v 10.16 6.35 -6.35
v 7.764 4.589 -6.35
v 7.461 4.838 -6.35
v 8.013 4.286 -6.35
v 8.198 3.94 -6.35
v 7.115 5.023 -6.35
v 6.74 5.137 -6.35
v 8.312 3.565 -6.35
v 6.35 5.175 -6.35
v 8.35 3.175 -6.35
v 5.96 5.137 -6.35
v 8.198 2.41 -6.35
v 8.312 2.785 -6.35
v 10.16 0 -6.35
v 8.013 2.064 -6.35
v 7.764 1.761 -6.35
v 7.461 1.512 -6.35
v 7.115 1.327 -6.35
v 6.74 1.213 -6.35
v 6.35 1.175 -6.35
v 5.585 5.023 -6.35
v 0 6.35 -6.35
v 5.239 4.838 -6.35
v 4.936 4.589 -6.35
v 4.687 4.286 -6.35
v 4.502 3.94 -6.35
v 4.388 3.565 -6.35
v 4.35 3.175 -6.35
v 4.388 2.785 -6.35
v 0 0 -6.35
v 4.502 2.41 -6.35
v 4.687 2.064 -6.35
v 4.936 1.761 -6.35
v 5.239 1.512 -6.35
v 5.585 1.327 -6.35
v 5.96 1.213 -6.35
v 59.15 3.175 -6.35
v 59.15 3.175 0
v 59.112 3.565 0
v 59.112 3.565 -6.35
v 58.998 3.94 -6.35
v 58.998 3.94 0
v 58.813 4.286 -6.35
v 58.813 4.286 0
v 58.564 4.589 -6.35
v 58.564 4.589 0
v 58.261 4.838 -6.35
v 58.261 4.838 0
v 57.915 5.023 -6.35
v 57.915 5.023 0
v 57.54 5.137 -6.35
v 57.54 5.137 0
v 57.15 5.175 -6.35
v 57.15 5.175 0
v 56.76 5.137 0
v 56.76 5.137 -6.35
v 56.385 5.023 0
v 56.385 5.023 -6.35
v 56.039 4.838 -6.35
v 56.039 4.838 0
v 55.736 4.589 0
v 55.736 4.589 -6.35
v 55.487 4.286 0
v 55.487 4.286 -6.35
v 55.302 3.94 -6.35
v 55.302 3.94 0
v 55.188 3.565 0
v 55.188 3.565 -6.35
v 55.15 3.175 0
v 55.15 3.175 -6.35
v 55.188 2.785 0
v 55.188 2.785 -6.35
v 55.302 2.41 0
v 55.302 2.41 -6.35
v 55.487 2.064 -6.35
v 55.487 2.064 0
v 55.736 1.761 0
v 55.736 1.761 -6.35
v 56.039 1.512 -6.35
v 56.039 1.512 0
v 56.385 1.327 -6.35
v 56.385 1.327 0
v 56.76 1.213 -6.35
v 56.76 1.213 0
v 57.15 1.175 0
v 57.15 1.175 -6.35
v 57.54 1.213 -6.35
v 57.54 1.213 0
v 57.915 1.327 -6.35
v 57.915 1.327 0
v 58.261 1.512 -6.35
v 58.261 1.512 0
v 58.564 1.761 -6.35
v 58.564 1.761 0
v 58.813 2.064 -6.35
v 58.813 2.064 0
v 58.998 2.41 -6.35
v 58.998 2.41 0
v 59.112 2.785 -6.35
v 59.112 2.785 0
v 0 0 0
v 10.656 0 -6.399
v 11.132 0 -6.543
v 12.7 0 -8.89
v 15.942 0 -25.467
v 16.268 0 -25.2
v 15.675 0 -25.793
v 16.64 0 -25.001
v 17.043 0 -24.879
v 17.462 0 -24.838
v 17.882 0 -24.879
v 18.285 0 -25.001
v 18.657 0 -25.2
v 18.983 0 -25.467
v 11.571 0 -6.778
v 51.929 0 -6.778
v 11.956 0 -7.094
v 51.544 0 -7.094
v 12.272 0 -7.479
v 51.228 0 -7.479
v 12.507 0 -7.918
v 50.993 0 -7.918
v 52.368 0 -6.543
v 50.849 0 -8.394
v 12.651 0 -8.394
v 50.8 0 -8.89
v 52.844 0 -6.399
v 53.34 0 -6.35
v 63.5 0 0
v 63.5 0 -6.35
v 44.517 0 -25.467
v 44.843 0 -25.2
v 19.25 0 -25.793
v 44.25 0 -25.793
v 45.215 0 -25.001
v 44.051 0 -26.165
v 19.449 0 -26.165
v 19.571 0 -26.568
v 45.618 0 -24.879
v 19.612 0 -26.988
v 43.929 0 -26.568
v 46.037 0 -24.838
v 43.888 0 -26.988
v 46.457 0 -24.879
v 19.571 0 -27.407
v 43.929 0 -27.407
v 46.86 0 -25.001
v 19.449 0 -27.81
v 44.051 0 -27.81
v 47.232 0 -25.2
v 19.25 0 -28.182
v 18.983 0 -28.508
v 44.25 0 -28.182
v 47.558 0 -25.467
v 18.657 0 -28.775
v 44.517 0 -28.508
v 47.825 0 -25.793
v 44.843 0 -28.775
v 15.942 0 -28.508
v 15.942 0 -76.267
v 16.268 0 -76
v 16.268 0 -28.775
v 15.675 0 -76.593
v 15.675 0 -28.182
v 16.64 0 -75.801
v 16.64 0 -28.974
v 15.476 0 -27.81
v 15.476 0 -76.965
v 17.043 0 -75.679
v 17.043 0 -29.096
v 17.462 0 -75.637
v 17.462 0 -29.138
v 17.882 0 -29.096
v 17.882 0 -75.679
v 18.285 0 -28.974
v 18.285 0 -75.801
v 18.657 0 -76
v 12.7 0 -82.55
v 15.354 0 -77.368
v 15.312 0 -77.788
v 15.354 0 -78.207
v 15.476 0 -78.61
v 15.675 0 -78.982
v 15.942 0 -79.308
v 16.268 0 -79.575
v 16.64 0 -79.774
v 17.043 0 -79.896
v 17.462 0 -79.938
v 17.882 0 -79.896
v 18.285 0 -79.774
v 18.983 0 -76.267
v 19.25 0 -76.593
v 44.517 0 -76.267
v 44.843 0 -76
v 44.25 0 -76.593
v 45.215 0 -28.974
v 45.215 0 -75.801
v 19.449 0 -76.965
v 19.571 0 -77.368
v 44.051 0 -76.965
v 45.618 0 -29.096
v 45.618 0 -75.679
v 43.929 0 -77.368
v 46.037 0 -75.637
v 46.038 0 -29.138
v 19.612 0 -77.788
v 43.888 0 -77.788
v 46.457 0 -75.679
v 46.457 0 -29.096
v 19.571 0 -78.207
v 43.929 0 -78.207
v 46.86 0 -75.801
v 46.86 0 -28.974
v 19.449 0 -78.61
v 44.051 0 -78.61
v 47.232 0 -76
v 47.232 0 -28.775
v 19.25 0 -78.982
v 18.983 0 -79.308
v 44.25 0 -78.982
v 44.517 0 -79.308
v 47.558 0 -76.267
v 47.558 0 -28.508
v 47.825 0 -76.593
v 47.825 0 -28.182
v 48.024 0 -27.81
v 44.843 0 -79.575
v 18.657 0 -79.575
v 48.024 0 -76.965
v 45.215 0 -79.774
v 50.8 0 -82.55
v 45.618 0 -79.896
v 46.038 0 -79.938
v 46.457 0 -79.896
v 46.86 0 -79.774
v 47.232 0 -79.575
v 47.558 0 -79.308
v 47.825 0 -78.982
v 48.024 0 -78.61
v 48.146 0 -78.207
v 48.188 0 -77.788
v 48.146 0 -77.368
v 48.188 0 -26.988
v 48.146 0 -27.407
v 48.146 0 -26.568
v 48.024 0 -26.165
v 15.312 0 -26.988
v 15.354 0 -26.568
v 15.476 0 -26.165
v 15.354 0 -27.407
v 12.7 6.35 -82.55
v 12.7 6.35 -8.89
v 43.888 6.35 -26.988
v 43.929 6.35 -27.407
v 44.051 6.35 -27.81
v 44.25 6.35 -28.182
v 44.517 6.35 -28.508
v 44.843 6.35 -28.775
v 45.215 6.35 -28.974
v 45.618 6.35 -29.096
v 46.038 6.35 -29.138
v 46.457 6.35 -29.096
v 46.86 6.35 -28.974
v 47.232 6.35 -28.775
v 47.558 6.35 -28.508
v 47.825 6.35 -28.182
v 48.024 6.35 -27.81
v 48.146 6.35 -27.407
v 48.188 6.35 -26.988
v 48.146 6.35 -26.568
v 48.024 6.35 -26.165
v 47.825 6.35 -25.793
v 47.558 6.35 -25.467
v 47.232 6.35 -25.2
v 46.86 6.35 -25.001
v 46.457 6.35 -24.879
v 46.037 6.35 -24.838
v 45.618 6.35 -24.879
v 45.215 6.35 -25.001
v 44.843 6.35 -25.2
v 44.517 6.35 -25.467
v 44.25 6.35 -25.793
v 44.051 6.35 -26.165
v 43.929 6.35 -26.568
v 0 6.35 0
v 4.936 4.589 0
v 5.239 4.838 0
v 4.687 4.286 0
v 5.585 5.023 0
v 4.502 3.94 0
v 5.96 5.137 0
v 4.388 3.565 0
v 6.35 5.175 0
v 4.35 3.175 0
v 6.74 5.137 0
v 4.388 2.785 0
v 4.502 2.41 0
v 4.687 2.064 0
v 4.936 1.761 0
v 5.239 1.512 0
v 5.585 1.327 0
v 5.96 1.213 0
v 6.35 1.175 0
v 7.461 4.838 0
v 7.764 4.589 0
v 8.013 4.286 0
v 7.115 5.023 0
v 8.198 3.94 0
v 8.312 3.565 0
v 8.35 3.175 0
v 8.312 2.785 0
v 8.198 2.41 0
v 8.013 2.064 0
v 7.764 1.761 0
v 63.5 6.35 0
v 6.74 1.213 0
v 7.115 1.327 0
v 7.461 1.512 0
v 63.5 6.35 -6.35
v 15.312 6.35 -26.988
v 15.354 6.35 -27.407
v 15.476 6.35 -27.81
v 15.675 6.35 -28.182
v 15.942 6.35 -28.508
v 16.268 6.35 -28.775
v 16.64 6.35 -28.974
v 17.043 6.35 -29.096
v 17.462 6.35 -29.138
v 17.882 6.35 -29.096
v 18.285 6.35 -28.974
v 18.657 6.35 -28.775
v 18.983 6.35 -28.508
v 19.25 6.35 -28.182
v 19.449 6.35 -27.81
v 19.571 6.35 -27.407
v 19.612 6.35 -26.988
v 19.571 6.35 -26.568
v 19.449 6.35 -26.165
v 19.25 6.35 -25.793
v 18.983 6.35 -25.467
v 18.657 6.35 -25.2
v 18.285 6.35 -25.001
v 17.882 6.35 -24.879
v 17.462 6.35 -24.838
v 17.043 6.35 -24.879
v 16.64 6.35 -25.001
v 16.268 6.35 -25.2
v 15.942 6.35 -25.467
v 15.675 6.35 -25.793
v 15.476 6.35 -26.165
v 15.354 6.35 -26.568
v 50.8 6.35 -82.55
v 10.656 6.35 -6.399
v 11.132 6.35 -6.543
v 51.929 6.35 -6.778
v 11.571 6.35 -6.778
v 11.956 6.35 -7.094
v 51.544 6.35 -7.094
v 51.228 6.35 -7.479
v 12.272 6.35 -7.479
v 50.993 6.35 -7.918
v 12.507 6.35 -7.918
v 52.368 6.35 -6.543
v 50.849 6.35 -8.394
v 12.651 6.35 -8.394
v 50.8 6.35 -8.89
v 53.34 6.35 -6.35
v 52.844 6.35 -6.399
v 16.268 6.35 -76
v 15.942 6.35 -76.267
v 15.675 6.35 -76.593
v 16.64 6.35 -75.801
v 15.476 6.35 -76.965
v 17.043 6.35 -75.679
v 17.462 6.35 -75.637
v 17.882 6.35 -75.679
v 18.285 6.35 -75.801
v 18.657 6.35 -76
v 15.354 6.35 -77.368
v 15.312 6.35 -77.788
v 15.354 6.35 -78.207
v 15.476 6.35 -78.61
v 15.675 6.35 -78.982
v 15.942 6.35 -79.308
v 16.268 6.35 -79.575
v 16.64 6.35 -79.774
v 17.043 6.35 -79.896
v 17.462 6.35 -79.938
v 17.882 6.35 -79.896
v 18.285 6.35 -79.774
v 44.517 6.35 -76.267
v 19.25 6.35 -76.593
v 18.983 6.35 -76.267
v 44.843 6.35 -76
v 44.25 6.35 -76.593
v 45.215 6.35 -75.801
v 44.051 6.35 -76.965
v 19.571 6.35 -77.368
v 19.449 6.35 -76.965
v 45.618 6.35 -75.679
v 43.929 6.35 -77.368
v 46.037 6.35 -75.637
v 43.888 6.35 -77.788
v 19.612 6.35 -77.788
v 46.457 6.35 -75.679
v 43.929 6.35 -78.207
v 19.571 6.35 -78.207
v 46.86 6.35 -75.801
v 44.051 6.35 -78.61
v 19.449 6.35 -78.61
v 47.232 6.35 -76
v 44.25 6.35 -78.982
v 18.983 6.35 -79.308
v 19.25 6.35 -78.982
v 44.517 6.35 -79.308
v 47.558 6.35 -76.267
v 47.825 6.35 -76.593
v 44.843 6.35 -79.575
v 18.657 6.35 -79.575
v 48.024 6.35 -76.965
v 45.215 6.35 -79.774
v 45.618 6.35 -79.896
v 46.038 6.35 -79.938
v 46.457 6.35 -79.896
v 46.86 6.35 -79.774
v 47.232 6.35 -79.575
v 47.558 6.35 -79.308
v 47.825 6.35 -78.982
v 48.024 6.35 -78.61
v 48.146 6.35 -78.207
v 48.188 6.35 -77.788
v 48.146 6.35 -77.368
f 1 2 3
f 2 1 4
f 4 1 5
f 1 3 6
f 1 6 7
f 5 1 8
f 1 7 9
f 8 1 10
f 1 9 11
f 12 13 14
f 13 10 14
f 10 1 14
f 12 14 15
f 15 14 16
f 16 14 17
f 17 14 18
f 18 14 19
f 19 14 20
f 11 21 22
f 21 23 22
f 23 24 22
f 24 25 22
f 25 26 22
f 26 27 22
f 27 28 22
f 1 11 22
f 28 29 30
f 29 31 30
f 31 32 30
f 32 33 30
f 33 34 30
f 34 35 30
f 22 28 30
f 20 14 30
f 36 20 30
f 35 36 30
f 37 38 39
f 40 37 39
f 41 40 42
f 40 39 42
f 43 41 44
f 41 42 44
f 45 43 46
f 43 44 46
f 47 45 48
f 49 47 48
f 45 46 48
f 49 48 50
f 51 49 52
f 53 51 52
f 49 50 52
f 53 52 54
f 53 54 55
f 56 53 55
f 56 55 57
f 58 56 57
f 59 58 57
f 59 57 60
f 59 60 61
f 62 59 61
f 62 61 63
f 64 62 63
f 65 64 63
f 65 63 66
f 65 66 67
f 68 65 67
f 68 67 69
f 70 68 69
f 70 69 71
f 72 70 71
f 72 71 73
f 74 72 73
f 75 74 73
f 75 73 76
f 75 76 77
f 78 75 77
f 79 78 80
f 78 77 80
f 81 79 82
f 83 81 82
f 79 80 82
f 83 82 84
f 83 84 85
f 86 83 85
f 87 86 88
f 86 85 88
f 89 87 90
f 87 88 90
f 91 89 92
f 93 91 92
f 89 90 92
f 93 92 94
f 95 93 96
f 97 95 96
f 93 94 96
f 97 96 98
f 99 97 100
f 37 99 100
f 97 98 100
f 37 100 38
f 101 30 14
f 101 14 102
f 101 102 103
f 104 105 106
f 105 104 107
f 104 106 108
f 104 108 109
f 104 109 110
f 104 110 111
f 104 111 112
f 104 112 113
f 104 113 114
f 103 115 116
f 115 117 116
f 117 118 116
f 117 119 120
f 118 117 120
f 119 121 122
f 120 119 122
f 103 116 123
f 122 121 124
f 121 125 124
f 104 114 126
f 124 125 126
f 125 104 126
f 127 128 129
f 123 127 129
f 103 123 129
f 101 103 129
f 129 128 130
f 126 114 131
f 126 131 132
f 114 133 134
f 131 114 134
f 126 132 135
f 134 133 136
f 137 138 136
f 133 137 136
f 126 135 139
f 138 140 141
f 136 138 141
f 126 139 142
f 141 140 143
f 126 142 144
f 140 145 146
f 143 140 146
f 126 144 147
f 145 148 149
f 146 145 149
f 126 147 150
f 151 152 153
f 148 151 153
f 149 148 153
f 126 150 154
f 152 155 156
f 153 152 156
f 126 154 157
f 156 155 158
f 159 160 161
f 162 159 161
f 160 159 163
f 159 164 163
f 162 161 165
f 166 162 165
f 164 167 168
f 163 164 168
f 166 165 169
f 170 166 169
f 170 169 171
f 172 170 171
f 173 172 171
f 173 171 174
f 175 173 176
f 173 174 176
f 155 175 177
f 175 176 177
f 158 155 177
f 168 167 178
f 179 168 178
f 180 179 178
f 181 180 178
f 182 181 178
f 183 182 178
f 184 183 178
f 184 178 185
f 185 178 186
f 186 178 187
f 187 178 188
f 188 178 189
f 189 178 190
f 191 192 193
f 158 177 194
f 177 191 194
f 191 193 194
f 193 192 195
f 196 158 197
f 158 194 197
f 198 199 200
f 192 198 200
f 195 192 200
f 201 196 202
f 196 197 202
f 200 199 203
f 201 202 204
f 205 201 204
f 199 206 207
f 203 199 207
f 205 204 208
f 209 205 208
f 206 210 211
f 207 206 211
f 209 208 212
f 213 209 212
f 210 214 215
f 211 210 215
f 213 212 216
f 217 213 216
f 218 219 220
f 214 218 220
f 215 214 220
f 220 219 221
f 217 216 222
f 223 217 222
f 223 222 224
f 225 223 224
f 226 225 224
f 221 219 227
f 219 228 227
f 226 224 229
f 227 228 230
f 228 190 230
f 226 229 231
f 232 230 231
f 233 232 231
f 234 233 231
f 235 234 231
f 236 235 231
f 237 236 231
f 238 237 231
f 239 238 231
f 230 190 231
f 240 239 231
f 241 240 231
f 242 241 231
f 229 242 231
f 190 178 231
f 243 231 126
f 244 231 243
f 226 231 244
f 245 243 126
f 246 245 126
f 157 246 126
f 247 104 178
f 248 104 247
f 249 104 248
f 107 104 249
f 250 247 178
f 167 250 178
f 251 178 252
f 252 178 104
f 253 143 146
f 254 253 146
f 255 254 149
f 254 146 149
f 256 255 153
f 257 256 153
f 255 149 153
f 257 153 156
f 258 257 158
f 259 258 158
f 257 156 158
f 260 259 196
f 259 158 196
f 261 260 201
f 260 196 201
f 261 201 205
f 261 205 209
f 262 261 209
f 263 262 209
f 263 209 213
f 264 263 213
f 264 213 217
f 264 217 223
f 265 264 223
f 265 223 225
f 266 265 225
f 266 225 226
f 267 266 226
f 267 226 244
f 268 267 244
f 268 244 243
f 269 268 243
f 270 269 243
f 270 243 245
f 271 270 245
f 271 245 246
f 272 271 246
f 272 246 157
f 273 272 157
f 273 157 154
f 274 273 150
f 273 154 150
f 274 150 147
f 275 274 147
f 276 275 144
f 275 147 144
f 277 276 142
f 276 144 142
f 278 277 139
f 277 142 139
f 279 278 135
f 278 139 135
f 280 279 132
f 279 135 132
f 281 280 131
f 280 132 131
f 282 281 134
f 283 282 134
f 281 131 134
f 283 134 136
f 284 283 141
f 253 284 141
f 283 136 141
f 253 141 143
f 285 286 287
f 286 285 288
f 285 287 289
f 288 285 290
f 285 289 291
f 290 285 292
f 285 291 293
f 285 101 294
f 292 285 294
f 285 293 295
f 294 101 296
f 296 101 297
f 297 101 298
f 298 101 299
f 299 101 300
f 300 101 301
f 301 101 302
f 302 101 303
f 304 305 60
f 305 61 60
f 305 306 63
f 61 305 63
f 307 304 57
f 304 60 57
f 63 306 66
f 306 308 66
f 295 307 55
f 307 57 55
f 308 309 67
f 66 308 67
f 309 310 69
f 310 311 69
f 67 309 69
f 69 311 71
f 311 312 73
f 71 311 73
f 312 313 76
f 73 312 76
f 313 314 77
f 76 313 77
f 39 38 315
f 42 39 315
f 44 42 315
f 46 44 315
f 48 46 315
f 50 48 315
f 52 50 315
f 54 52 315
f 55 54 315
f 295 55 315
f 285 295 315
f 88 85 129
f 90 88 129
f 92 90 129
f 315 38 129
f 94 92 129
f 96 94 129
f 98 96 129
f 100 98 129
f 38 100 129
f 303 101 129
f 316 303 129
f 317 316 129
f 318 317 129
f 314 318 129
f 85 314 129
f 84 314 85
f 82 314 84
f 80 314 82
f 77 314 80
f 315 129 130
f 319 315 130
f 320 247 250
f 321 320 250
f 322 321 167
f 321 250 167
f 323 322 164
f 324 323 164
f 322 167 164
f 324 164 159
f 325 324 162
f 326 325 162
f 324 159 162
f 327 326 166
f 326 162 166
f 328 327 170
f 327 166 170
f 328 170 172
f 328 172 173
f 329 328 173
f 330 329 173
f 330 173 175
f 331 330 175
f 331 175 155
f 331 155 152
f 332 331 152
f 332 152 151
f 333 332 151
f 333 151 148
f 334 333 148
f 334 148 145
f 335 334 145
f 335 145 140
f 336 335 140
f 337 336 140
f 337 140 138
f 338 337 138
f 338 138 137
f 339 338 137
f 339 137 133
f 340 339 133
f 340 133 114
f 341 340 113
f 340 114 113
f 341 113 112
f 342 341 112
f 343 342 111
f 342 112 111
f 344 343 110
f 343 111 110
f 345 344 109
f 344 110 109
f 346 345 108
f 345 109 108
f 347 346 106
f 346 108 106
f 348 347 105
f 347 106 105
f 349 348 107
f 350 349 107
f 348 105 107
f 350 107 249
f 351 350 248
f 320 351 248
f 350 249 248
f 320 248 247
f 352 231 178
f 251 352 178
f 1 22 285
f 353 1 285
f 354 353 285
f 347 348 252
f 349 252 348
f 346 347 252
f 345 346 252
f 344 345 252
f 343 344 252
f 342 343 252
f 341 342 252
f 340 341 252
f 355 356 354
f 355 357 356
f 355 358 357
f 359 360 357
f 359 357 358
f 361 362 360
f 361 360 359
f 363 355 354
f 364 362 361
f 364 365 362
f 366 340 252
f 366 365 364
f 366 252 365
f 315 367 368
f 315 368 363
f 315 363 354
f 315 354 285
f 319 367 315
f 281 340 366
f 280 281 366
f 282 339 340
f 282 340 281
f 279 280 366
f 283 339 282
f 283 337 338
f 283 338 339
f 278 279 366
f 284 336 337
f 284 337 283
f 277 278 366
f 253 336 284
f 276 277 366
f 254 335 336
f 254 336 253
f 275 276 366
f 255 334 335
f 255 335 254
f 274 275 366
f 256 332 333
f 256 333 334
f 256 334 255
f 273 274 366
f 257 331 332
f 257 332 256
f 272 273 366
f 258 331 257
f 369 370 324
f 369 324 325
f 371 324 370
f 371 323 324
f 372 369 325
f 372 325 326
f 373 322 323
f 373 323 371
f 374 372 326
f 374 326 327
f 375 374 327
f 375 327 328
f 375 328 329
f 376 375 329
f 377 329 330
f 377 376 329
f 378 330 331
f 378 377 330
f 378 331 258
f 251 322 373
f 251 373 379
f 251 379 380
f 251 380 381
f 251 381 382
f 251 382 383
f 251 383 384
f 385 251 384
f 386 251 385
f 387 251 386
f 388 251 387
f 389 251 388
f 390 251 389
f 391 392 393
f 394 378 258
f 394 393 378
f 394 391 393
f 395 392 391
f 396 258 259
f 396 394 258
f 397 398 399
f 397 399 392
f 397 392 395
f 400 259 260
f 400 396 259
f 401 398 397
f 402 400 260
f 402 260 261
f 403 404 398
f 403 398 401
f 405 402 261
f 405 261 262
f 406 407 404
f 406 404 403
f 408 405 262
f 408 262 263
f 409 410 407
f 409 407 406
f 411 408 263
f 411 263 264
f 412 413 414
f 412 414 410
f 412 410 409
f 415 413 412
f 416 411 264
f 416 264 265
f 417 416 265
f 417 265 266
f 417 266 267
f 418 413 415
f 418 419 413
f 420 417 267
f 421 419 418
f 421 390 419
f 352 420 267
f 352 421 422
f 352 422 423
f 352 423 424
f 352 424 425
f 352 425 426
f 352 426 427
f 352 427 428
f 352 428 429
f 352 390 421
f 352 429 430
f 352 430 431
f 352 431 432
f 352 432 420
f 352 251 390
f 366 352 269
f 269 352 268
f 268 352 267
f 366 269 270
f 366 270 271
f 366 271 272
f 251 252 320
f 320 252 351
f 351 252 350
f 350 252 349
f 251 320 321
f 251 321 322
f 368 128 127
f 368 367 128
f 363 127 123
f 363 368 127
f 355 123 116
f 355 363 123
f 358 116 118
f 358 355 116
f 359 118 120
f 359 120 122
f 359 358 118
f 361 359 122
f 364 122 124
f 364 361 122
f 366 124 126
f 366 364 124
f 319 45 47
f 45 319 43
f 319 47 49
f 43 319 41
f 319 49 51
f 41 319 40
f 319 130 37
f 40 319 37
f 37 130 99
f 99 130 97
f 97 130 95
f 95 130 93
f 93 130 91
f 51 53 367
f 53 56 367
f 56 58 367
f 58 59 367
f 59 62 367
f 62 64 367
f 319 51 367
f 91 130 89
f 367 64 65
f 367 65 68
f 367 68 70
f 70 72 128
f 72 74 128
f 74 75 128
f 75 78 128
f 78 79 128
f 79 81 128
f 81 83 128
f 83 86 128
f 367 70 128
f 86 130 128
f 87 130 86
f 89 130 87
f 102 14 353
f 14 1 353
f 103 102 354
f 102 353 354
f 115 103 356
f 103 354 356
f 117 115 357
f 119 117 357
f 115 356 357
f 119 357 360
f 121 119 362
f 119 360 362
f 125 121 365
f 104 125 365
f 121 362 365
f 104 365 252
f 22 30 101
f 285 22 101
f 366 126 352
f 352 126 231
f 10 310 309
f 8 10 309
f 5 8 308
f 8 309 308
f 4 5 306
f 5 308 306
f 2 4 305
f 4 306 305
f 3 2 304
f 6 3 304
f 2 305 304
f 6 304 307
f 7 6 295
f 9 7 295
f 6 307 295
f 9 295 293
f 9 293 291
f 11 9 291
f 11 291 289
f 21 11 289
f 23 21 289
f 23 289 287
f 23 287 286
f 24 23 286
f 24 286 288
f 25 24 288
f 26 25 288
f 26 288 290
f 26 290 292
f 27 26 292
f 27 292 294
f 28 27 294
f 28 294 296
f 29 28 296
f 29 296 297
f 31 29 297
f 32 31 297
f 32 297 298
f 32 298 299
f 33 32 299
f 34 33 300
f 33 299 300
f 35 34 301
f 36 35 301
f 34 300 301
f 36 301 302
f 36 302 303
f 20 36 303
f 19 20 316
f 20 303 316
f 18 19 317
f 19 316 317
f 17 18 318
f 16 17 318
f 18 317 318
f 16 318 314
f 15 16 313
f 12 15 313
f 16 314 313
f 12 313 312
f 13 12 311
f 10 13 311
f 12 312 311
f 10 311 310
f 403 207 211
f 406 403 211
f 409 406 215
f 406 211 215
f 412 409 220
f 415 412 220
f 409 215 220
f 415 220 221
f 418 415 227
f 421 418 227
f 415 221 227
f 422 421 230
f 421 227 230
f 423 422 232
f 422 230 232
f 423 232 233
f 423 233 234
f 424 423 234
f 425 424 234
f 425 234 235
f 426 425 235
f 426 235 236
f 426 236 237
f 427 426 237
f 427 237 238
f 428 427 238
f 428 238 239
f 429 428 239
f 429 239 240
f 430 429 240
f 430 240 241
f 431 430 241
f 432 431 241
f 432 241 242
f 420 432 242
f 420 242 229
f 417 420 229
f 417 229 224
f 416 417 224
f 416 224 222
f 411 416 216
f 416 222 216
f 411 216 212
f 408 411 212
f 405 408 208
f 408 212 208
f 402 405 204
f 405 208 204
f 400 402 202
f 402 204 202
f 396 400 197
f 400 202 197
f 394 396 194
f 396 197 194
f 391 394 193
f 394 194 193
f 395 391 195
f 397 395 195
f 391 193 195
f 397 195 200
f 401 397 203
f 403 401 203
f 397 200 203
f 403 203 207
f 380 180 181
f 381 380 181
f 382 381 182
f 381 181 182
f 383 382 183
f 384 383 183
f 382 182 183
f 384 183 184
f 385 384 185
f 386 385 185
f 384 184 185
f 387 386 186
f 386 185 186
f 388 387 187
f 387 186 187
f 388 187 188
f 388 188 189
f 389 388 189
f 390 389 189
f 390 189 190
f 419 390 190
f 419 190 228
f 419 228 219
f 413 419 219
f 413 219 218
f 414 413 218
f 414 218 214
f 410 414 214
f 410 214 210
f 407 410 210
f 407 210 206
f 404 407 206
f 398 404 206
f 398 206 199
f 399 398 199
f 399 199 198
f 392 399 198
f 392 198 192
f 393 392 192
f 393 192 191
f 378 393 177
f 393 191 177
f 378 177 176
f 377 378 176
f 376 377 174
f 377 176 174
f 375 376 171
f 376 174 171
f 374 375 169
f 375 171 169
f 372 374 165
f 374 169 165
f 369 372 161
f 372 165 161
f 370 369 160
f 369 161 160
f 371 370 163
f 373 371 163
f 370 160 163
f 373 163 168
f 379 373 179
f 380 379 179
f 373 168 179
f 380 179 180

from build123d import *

# Parameters (mm, degrees)
BOSS_EXTRUDE1_DEPTH     = 6.35
SKETCH2_R               = 2
CUT_EXTRUDE1_DEPTH      = 1
CUT_EXTRUDE1_DEPTH_BACK = 83.55
FILLET1_R               = 2.54
M4_CLEARANCE_HOLE1_D    = 4.3


with BuildPart() as part:
    # Sketch1 → Boss-Extrude1 (new body)
    with BuildSketch(Plane(origin=(0, 0, 0), x_dir=(1, 0, 0), z_dir=(0, 1, 0))):
        Polygon((0, 0), (63.5, 0), (63.5, 6.35), (50.8, 6.35), (50.8, 82.55), (12.7, 82.55), (12.7, 6.35), (0, 6.35), align=None)
    extrude(amount=BOSS_EXTRUDE1_DEPTH)

    # Sketch2 → Cut-Extrude1 (cut, two sides)
    with BuildSketch(Plane.XY) as cut_extrude1_sk:
        with Locations((6.35, 3.175)):
            Circle(SKETCH2_R)
        with Locations((57.15, 3.175)):
            Circle(SKETCH2_R)
    extrude(amount=CUT_EXTRUDE1_DEPTH, mode=Mode.SUBTRACT)
    extrude(cut_extrude1_sk.sketch, amount=-CUT_EXTRUDE1_DEPTH_BACK, mode=Mode.SUBTRACT)

    # Fillet1
    fillet1_edges = [part.edges().sort_by_distance(p)[0] for p in [
        (12.7, 3.175, -6.35),
        (50.8, 3.175, -6.35),
    ]]
    fillet(fillet1_edges, radius=FILLET1_R)

    # M4 Clearance Hole1 (through all)
    with Locations(Plane(origin=(0, 6.35, 0), x_dir=(1, 0, 0), z_dir=(0, 1, 0))):
        with Locations((17.4625, 77.7875), (46.0375, 77.7875), (46.0375, 26.9875), (17.4625, 26.9875)):
            Hole(M4_CLEARANCE_HOLE1_D / 2)


solid = part.part
